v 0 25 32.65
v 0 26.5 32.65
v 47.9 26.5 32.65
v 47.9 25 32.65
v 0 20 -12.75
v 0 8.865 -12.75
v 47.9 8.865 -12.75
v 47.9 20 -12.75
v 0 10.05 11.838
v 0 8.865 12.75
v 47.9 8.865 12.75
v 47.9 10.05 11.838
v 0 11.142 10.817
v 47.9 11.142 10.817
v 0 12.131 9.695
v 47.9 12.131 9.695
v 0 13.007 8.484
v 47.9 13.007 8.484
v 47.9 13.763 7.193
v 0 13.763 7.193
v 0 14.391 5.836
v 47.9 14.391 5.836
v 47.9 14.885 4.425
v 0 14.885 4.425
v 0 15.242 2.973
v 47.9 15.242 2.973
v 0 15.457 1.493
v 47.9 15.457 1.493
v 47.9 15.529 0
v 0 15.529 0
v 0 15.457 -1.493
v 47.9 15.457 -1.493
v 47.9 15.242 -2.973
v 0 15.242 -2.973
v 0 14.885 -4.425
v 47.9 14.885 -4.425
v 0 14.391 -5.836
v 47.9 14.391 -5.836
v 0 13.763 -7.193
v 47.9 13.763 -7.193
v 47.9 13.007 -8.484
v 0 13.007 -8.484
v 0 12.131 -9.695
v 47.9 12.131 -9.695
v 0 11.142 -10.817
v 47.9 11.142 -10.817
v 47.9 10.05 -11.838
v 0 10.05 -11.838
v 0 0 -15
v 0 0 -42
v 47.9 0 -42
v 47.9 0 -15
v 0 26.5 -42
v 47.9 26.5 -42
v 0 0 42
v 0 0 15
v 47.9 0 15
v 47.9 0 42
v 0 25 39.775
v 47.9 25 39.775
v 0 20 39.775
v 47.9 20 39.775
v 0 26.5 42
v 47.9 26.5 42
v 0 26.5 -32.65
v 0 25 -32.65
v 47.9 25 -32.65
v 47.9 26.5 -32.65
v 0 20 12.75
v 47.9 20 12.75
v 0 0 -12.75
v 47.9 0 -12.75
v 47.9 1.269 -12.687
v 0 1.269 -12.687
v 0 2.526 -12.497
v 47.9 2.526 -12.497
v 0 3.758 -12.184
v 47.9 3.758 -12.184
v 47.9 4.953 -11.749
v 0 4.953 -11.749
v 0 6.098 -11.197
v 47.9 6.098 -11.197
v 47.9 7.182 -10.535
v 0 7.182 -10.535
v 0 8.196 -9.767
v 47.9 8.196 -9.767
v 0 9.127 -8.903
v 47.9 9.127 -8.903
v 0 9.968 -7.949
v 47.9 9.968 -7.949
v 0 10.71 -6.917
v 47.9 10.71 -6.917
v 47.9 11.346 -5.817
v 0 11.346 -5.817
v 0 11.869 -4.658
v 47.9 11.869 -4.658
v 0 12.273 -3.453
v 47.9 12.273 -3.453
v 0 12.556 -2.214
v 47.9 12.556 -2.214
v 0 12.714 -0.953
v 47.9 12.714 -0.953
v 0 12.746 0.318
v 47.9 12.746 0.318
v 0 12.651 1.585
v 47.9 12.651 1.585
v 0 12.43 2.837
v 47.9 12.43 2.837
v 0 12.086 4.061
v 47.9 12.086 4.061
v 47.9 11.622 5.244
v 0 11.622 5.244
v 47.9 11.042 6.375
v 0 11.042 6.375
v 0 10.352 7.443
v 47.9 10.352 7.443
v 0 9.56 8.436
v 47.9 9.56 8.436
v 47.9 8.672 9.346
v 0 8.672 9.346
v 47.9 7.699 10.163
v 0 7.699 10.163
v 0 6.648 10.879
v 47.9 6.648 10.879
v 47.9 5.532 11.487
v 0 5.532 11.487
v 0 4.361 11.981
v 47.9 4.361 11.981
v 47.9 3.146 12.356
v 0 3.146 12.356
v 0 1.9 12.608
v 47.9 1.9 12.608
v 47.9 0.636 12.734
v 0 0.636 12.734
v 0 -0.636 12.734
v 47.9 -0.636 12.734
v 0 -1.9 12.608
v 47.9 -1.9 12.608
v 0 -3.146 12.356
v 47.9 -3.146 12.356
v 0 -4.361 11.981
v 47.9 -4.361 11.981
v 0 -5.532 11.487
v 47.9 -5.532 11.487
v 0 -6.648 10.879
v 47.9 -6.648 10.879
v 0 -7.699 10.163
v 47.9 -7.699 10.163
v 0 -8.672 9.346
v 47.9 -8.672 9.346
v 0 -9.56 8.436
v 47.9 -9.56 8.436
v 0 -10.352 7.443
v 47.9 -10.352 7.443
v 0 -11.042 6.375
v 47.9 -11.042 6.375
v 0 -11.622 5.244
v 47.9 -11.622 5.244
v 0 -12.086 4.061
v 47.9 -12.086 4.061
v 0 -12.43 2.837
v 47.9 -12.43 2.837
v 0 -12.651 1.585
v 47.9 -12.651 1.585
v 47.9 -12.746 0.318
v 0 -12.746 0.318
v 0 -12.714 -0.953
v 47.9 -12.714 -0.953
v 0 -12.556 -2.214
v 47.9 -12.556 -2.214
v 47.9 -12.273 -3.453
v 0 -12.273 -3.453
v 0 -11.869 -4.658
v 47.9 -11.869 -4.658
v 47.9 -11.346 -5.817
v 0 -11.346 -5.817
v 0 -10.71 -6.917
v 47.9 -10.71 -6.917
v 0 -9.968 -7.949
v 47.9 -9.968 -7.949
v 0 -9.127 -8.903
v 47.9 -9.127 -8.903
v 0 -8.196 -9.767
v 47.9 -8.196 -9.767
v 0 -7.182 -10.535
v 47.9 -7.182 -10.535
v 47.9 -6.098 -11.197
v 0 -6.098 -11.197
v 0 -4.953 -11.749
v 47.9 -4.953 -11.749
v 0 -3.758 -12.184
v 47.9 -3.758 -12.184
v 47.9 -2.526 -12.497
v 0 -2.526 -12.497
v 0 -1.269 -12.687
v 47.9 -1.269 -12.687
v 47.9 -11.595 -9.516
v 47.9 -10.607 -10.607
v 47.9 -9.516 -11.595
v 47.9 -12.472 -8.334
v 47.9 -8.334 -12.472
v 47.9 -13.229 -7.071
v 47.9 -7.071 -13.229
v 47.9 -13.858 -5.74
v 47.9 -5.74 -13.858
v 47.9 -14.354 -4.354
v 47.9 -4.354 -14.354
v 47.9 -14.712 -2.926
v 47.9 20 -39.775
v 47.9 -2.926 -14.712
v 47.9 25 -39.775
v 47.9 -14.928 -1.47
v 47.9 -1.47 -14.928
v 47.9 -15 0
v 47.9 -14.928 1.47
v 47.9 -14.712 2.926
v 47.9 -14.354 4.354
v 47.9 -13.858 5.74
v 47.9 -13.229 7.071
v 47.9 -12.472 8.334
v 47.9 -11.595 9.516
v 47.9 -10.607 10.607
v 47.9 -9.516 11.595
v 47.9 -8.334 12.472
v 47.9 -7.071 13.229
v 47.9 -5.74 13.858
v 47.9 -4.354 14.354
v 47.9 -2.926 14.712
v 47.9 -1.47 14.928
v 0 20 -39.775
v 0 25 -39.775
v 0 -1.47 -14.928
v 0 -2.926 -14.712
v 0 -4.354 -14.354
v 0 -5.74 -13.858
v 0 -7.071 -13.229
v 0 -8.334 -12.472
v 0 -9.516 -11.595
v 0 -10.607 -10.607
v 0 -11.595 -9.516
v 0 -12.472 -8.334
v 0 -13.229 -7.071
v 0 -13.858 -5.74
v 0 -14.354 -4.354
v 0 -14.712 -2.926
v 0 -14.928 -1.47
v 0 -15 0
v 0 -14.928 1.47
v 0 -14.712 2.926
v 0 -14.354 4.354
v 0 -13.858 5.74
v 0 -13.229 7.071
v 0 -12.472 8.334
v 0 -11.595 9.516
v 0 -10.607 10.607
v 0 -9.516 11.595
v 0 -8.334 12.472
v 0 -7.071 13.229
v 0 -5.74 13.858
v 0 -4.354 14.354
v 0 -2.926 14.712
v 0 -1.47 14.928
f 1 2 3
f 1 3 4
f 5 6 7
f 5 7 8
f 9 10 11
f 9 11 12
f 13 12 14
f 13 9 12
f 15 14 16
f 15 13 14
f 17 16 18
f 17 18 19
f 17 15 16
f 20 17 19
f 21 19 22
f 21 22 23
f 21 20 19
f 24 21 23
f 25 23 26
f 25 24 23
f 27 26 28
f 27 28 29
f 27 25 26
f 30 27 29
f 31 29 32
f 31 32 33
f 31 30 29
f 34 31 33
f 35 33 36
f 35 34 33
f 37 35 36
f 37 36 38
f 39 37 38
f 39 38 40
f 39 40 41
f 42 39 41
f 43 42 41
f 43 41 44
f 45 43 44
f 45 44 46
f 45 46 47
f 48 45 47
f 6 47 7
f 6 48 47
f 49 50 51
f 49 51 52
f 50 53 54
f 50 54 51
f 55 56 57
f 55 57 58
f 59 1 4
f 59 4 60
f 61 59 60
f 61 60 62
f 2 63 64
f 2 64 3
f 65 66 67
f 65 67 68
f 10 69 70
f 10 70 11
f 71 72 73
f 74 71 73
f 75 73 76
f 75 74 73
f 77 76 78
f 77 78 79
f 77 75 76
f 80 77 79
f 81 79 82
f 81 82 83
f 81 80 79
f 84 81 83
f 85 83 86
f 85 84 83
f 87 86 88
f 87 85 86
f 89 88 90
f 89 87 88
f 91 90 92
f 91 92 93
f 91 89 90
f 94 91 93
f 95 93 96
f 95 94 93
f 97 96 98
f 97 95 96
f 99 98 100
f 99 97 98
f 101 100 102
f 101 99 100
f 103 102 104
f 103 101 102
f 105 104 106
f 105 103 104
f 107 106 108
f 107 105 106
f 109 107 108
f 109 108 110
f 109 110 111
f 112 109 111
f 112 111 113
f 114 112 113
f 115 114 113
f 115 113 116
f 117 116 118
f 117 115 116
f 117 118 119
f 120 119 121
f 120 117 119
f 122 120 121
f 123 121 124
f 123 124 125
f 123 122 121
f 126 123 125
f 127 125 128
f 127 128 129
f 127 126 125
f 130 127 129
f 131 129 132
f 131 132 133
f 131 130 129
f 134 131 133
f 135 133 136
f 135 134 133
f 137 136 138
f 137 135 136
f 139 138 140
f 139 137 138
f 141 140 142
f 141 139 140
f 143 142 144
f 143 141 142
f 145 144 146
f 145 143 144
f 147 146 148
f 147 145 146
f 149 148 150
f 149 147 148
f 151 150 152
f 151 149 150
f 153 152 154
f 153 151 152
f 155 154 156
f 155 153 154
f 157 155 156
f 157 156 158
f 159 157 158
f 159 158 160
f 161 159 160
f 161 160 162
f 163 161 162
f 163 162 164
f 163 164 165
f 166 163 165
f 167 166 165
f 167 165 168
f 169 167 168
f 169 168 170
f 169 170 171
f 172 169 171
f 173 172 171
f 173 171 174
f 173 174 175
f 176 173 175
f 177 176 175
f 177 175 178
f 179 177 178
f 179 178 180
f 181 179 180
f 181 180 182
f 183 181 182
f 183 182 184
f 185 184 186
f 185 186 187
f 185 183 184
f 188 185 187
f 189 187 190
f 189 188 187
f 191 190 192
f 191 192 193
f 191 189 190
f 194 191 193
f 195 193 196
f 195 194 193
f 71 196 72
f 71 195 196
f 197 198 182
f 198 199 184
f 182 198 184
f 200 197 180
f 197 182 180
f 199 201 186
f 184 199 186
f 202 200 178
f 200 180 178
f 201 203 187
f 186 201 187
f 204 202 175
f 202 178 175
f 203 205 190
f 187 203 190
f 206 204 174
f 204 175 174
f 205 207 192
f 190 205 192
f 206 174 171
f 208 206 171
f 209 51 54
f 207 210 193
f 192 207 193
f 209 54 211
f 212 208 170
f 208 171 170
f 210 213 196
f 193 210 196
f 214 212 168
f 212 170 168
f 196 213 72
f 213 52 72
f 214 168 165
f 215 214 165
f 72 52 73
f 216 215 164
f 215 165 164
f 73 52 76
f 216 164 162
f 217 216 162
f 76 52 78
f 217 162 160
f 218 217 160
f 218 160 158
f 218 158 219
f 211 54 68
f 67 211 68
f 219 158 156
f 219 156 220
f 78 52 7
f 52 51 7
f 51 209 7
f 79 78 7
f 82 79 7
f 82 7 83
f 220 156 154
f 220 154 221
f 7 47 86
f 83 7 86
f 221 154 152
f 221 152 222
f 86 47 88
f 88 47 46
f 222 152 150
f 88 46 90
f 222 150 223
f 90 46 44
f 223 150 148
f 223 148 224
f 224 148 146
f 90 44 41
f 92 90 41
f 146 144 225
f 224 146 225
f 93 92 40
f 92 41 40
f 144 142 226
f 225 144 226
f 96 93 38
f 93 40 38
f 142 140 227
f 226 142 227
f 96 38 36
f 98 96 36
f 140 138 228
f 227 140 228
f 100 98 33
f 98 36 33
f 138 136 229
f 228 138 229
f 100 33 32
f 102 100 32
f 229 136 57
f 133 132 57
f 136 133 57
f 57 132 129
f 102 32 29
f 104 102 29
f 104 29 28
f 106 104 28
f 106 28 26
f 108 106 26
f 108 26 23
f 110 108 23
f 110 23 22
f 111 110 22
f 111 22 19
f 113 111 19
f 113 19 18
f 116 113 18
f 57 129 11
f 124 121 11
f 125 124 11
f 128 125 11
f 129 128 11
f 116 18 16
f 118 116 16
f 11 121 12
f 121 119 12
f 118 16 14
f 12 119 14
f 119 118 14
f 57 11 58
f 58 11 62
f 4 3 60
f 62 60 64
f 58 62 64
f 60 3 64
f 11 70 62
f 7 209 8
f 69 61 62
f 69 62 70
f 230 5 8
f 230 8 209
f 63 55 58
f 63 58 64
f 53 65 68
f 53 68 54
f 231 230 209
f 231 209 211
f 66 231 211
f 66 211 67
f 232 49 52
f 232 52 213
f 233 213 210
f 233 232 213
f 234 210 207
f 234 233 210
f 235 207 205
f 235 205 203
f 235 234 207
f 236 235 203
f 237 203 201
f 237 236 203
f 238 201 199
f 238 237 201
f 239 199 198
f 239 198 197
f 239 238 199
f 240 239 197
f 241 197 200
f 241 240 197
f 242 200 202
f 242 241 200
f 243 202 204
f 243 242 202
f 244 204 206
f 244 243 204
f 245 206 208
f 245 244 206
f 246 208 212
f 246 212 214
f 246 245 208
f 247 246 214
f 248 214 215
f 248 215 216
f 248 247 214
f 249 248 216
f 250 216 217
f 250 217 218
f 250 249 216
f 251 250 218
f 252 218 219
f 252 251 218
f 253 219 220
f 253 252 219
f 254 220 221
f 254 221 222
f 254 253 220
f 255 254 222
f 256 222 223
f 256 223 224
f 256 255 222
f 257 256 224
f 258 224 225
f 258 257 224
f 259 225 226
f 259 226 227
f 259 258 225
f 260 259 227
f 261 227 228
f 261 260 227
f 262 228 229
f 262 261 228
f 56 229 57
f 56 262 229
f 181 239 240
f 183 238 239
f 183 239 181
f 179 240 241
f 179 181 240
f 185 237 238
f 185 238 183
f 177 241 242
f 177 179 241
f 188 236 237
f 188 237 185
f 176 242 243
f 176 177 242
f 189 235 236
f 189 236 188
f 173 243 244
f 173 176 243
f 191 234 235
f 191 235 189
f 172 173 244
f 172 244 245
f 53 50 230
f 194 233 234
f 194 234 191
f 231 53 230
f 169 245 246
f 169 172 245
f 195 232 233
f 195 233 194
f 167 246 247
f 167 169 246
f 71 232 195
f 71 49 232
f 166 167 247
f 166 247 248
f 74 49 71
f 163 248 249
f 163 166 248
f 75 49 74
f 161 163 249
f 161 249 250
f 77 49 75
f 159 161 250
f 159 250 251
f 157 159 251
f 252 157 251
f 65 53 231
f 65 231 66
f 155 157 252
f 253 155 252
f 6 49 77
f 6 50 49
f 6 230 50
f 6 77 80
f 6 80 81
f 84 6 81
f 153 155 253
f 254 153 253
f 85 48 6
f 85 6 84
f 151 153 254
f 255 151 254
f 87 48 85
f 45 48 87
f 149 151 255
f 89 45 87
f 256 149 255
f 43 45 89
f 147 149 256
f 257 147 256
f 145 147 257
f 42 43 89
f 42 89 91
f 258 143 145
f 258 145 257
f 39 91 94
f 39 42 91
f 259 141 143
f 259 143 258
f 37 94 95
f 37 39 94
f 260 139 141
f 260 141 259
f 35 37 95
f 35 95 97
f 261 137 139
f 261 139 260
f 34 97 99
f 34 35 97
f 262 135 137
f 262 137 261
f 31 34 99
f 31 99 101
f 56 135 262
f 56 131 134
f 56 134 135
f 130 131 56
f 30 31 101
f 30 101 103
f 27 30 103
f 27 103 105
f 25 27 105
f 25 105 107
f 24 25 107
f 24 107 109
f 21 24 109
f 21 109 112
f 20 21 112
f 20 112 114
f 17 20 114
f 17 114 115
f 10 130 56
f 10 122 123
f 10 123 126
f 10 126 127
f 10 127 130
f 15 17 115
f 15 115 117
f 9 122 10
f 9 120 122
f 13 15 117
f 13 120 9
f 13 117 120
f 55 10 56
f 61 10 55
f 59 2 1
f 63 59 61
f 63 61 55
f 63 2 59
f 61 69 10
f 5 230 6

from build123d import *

# Parameters (mm, degrees)
BOSS_EXTRUDE1_DEPTH = 47.9


with BuildPart() as part:
    # Sketch1 → Boss-Extrude1 (new body)
    with BuildSketch(Plane(origin=(0, 0, 0), x_dir=(0, 0, -1), z_dir=(1, 0, 0))):
        with BuildLine():
            Line((-15, 0), (-42, 0))
            Line((-42, 0), (-42, 26.5))
            Line((-42, 26.5), (-32.65, 26.5))
            Line((-32.65, 26.5), (-32.65, 25))
            Line((-32.65, 25), (-39.775, 25))
            Line((-39.775, 25), (-39.775, 20))
            Line((-39.775, 20), (-12.75, 20))
            Line((-12.75, 20), (-12.75, 8.865100112))
            ThreePointArc((-12.75, 8.865100112), (0, 15.529085614), (12.75, 8.865100112))
            Line((12.75, 8.865100112), (12.75, 20))
            Line((12.75, 20), (39.775, 20))
            Line((39.775, 20), (39.775, 25))
            Line((39.775, 25), (32.65, 25))
            Line((32.65, 25), (32.65, 26.5))
            Line((32.65, 26.5), (42, 26.5))
            Line((42, 26.5), (42, 0))
            Line((42, 0), (15, 0))
            ThreePointArc((15, 0), (0, -15), (-15, 0))
        make_face()
        with BuildLine():
            ThreePointArc((-12.75, 0), (0, -12.75), (12.75, 0))
            ThreePointArc((12.75, 0), (0, 12.75), (-12.75, 0))
        make_face(mode=Mode.SUBTRACT)
    extrude(amount=BOSS_EXTRUDE1_DEPTH)


solid = part.part
